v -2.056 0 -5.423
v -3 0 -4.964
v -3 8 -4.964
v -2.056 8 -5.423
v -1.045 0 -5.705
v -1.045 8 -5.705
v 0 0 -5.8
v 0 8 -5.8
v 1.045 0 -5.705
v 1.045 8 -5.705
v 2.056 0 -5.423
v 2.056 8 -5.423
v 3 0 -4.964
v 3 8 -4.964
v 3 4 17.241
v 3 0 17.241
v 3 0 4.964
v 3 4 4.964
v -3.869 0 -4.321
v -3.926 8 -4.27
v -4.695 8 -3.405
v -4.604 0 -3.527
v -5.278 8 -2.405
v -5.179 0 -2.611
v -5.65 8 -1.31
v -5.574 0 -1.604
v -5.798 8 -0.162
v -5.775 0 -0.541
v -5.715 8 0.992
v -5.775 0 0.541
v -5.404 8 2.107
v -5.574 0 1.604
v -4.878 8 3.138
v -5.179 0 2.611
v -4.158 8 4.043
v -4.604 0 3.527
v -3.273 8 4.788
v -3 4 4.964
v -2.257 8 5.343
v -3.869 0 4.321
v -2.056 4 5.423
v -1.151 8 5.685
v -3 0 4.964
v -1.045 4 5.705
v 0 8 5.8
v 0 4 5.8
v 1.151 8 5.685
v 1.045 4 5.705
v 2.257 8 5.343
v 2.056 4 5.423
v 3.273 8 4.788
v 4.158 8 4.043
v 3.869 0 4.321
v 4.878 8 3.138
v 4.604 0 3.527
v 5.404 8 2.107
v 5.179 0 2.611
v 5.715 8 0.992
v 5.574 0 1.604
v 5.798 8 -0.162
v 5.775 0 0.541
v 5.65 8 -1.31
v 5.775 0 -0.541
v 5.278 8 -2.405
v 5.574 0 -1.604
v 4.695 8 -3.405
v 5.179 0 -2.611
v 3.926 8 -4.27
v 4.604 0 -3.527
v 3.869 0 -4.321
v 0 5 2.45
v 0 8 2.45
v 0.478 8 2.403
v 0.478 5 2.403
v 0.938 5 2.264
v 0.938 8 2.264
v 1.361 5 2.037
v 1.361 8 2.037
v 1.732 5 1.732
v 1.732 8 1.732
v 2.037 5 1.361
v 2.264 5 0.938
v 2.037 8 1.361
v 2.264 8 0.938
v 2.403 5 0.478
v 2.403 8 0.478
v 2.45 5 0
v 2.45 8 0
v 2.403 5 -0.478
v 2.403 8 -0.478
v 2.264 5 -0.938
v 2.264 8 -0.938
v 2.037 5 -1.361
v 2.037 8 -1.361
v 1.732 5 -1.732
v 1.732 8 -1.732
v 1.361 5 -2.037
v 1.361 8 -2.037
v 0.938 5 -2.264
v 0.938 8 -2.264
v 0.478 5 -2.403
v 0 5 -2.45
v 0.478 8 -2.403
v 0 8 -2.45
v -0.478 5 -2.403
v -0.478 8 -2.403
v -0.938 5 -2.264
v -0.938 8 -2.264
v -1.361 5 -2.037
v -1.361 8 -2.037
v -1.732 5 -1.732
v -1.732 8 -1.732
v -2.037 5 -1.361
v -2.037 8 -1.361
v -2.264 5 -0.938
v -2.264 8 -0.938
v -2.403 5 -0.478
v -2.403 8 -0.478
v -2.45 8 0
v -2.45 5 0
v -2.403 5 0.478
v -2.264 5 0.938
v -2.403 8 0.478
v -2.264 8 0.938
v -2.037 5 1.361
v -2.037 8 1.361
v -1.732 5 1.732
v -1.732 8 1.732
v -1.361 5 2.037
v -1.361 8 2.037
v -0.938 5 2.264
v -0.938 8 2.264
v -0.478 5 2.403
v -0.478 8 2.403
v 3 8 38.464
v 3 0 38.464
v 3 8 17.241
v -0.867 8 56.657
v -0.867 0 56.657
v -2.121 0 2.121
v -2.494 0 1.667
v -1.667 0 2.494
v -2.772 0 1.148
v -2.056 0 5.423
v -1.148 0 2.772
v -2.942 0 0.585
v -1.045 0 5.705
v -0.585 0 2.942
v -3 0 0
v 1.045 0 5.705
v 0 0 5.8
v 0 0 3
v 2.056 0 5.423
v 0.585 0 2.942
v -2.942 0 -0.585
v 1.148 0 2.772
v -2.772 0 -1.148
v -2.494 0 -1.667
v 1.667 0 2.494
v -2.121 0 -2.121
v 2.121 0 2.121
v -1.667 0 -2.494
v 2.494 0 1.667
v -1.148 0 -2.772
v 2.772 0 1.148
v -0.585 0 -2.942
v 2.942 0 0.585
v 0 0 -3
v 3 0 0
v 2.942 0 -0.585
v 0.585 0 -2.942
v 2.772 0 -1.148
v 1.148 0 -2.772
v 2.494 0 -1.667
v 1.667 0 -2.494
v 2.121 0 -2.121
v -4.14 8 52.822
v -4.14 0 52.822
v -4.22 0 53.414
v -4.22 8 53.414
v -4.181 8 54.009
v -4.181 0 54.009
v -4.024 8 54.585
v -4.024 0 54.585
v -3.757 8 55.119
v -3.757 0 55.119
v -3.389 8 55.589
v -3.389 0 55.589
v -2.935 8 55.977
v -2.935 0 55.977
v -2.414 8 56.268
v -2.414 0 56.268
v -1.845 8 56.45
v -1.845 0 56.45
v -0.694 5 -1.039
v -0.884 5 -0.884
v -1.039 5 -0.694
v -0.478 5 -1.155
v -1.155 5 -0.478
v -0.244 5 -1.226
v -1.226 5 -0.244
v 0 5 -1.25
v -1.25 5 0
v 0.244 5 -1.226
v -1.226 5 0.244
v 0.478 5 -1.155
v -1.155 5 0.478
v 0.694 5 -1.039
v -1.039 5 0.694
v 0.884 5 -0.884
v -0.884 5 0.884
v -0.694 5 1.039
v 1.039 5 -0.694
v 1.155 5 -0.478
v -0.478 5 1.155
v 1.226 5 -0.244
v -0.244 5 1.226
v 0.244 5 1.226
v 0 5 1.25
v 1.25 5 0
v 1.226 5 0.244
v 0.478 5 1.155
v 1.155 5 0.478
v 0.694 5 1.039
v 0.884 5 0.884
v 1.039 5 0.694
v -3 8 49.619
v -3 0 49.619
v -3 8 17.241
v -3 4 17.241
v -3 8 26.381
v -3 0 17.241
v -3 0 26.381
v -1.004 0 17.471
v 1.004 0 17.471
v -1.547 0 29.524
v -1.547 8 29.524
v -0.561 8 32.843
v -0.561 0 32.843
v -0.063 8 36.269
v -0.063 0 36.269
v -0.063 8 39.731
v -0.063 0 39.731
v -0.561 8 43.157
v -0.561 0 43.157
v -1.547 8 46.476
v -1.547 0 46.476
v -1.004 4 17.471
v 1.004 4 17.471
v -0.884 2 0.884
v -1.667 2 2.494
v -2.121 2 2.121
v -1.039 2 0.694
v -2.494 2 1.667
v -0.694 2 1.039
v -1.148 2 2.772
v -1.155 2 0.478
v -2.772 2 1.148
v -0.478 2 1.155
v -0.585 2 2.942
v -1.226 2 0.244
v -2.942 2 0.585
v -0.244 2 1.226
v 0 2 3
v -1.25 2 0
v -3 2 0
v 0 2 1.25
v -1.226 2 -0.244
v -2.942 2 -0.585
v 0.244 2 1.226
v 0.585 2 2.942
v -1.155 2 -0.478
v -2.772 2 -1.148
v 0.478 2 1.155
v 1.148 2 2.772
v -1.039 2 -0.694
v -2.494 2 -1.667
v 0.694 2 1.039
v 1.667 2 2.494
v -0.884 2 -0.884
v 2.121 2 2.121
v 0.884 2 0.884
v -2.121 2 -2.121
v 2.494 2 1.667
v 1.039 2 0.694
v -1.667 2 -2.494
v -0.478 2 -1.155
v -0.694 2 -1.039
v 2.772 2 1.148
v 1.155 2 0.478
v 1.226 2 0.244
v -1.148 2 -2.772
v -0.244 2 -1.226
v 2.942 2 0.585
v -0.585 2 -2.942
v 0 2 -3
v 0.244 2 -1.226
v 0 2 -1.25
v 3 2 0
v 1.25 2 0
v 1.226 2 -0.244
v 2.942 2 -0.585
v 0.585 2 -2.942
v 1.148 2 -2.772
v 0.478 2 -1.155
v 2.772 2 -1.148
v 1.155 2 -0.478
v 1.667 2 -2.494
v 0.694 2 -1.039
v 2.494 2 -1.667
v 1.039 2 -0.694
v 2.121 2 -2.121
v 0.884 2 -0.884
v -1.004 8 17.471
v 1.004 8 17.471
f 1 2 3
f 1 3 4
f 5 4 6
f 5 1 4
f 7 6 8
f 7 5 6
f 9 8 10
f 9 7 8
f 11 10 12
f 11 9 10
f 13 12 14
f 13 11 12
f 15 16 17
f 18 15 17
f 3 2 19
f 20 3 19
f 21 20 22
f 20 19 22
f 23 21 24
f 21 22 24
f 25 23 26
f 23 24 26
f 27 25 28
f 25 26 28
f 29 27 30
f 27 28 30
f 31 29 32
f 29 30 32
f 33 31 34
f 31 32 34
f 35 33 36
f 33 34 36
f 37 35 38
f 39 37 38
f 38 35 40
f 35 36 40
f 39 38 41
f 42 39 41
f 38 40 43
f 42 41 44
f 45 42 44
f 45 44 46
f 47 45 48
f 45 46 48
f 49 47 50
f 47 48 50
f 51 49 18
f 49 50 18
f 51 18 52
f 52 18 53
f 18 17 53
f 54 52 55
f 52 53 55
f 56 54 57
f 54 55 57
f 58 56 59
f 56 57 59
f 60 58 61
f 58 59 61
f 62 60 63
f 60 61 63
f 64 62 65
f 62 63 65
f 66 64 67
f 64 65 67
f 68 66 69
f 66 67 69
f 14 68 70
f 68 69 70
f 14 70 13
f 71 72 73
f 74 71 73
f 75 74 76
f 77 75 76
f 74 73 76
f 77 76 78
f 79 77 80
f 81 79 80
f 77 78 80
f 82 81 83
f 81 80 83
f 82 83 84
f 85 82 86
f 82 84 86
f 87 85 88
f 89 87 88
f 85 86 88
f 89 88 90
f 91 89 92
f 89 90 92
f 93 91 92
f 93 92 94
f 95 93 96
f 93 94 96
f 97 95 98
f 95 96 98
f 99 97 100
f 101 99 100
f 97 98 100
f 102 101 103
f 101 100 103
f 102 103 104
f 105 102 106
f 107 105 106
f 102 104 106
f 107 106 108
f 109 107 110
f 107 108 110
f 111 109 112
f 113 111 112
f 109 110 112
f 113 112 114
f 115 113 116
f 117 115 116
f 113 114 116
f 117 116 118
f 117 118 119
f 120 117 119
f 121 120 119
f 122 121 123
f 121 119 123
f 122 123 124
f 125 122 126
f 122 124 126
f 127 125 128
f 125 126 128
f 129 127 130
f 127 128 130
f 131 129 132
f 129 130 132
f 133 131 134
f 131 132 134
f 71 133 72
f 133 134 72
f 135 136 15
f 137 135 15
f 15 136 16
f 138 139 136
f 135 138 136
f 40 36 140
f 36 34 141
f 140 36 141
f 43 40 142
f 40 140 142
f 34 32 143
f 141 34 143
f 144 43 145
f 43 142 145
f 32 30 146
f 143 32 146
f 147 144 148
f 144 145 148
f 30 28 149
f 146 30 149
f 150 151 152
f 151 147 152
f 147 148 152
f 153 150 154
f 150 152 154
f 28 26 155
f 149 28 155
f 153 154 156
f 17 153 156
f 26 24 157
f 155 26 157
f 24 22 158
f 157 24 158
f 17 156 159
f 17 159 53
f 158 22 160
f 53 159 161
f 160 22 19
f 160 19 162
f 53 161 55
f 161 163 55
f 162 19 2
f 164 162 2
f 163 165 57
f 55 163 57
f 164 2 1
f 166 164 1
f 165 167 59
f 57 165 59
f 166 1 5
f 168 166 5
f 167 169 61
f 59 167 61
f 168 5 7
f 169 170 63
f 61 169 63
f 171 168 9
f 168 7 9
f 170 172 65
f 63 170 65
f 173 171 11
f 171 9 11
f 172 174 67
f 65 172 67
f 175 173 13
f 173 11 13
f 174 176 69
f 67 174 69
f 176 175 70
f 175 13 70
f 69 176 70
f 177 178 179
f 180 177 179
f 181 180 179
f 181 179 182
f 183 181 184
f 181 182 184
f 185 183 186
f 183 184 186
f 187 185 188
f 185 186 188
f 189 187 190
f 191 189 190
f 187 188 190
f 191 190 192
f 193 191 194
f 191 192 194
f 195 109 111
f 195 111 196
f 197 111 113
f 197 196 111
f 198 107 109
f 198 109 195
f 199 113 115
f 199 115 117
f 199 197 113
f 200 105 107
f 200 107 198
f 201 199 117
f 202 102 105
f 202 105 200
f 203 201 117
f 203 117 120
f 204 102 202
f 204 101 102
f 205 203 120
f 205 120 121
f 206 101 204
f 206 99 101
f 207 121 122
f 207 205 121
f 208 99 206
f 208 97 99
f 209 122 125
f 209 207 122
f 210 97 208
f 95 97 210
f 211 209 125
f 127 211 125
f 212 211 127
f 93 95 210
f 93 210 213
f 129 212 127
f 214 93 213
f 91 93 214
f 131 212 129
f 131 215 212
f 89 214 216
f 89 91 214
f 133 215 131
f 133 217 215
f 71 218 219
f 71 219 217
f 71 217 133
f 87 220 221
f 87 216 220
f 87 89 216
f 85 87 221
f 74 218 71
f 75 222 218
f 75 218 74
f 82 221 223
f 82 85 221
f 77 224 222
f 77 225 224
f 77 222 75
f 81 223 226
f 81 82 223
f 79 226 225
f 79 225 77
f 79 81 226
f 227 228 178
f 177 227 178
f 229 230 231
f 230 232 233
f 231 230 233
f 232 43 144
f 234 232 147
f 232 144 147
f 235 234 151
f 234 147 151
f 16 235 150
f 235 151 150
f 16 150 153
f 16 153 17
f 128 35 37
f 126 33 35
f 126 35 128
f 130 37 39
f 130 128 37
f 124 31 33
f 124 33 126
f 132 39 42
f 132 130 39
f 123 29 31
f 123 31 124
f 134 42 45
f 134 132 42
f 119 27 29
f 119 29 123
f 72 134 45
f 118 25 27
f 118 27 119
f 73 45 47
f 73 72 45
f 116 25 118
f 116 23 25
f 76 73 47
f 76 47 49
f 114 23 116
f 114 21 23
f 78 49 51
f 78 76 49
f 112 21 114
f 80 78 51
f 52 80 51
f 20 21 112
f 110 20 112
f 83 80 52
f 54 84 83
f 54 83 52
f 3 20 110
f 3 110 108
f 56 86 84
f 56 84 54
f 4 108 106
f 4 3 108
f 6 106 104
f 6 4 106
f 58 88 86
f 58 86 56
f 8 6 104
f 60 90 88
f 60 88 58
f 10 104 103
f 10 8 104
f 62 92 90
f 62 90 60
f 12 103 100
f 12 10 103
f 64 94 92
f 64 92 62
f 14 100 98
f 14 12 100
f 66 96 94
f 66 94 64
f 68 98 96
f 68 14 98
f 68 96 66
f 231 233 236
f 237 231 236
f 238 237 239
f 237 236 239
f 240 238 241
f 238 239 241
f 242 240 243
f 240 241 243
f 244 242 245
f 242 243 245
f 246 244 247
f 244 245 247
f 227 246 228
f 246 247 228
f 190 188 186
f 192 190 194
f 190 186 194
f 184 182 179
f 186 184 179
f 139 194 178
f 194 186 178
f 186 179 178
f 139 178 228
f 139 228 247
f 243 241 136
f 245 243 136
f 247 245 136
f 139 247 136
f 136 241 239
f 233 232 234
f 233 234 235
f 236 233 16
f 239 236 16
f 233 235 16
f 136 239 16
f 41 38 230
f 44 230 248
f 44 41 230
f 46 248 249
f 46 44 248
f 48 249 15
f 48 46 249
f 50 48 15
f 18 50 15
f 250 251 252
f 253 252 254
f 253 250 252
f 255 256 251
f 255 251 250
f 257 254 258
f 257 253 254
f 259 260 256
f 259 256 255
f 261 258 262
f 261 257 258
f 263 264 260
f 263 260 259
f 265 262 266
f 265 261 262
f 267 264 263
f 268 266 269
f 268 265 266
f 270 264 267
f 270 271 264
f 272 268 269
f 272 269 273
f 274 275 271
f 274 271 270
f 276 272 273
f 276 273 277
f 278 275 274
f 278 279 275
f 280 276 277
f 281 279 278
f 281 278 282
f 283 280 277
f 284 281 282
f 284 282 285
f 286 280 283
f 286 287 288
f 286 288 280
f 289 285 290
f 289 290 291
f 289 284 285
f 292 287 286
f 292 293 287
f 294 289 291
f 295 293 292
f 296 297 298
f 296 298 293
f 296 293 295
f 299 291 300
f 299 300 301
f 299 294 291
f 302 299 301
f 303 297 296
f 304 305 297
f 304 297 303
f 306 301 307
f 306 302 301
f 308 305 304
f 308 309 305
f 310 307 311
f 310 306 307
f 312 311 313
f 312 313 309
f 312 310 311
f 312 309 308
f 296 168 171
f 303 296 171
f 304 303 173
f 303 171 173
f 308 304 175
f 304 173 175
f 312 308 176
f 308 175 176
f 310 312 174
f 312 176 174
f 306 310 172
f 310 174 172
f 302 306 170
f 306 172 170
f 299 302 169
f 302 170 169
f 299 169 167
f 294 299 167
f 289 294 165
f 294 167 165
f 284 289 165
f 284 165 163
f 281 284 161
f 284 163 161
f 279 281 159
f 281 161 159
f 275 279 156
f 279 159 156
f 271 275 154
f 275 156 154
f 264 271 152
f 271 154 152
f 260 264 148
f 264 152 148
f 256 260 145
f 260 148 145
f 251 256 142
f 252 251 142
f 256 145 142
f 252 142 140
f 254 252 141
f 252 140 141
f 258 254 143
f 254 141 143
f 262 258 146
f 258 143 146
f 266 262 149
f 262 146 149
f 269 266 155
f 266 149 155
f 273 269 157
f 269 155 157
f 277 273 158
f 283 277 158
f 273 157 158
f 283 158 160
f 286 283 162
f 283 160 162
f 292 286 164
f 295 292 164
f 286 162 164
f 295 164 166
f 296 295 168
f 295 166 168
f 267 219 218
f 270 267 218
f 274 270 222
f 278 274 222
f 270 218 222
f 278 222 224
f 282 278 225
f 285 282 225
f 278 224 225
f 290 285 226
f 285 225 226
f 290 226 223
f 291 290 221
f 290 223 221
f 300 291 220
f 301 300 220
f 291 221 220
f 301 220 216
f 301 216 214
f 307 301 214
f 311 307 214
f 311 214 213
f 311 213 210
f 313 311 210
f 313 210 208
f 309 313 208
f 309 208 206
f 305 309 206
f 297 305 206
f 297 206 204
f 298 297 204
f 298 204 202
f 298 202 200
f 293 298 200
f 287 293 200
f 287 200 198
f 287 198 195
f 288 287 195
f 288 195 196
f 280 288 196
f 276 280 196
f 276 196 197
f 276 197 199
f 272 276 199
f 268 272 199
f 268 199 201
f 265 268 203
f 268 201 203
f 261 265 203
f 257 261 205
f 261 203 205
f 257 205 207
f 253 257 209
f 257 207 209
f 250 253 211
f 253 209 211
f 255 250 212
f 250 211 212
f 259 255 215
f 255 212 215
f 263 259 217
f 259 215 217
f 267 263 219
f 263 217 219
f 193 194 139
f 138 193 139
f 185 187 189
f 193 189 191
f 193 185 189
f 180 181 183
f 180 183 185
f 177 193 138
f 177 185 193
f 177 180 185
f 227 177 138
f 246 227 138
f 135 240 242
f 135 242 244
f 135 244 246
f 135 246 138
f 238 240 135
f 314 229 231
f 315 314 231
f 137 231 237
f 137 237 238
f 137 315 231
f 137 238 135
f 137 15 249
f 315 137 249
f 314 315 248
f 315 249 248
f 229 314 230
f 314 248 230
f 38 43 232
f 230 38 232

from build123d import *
from build123d.topology import SkipClean

# Parameters (mm, degrees)
BOSS_EXTRU_1_DEPTH             = 8
ESQUISSE2_R                    = 2.45
ENL_V_MAT_EXTRU_1_DEPTH        = 3
ENL_V_MAT_EXTRU_2_REACH        = 59.173
ESQUISSE3_R                    = 1.25
ESQUISSE4_R                    = 3
ENL_V_MAT_EXTRU_3_DEPTH        = 2
ENL_V_START                    = -4
ENL_V_MAT_EXTRU_4_DEPTH        = 4
CORPS_D_PLACER_COPIER1_DEPTH   = 8
CORPS_D_PLACER_COPIER1_2_DEPTH = 8
CORPS_D_PLACER_COPIER1_3_DEPTH = 4


# Read off the part's stored shape, not the designer's step: Corps-Déplacer/Copier1
with BuildPart() as part:
    # Esquisse1 → Boss.-Extru.1 (new body)
    with BuildSketch(Plane(origin=(0, 0, 0), x_dir=(1, 0, 0), z_dir=(0, 1, 0))):
        with BuildLine():
            Line((-3, 26.381049961), (-3, 4.963869458))
            ThreePointArc((-3, 4.963869458), (0, -5.8), (3, 4.963869458))
            Line((3, 4.963869458), (3, 38.463869458))
            Line((3, 38.463869458), (-0.867157449, 56.657414832))
            Line((-0.867157449, 56.657414832), (-1.84530505, 56.449503141))
            ThreePointArc((-1.84530505, 56.449503141), (-3.756758837, 55.119060789), (-4.140414176, 52.821988519))
            Line((-4.140414176, 52.821988519), (-3, 49.618950039))
            ThreePointArc((-3, 49.618950039), (0, 38), (-3, 26.381049961))
        make_face()
    extrude(amount=BOSS_EXTRU_1_DEPTH)

    # Esquisse2 → Enlèv. mat.-Extru.1 (cut)
    with BuildSketch(Plane(origin=(0, 8, 0), x_dir=(1, 0, 0), z_dir=(0, 1, 0))):
        with Locations(Location((0, 0, 0), (0, 0, 270))):
            Circle(ESQUISSE2_R)
    extrude(amount=-ENL_V_MAT_EXTRU_1_DEPTH, mode=Mode.SUBTRACT)

    # Esquisse3 → Enlèv. mat.-Extru.2 (cut, up to next)
    with BuildSketch(Plane(origin=(0, 5, 0), x_dir=(1, 0, 0), z_dir=(0, 1, 0)), mode=Mode.PRIVATE) as enl_v_mat_extru_2_sk1:
        with Locations(Location((0, 0, 0), (0, 0, 270))):
            Circle(ESQUISSE3_R)
    enl_v_mat_extru_2_tool1 = extrude(enl_v_mat_extru_2_sk1.sketch, amount=-ENL_V_MAT_EXTRU_2_REACH, mode=Mode.PRIVATE) & part.part
    add(enl_v_mat_extru_2_tool1.solids().sort_by_distance((0, 5, 0))[0], mode=Mode.SUBTRACT)

    # Esquisse4 → Enlèv. mat.-Extru.3 (cut)
    with BuildSketch(Plane.XZ):
        with Locations(Location((0, 0, 0), (0, 0, 270))):
            Circle(ESQUISSE4_R)
    extrude(amount=-ENL_V_MAT_EXTRU_3_DEPTH, mode=Mode.SUBTRACT)

    # Esquisse5 → Enlèv. mat.-Extru.4 (cut)
    with BuildSketch(Plane(origin=(0, 8, 0), x_dir=(1, 0, 0), z_dir=(0, 1, 0)).offset(ENL_V_START)):
        with BuildLine():
            Line((-3, 4.963869458), (-3, 17.24093965))
            ThreePointArc((-3, 17.24093965), (0, 17.5), (3, 17.24093965))
            Line((3, 17.24093965), (3, 4.963869458))
            ThreePointArc((3, 4.963869458), (0, 5.8), (-3, 4.963869458))
        make_face()
    extrude(amount=ENL_V_MAT_EXTRU_4_DEPTH, mode=Mode.SUBTRACT)

    # Corps-Déplacer/Copier1 outline → Corps-Déplacer/Copier1 (cut)
    with SkipClean():  # the faces are left unmerged after this step: merging them gives an invalid solid
        with BuildSketch(Plane(origin=(0, 0, 0), x_dir=(1, 0, 0), z_dir=(0, 1, 0))):
            with BuildLine():
                ThreePointArc((-3, 4.963869458), (0, 5.8), (3, 4.963869458))
                Line((3, 4.963869458), (3, 38.463869458))
                Line((3, 38.463869458), (-0.867157449, 56.657414832))
                Line((-0.867157449, 56.657414832), (-1.84530505, 56.449503141))
                ThreePointArc((-1.84530505, 56.449503141), (-3.756758837, 55.119060789), (-4.140414176, 52.821988519))
                Line((-4.140414176, 52.821988519), (-3, 49.618950039))
                ThreePointArc((-3, 49.618950039), (0, 38), (-3, 26.381049961))
                Line((-3, 26.381049961), (-3, 4.963869458))
            make_face()
        extrude(amount=CORPS_D_PLACER_COPIER1_DEPTH, mode=Mode.SUBTRACT)



with BuildPart() as body_2:
    # Corps-D_placer_Copier1 2 outline → Corps-D_placer_Copier1 2 (new body)
    with BuildSketch(Plane(origin=(0, 0, 0), x_dir=(1, 0, 0), z_dir=(0, 1, 0))):
        with BuildLine():
            Line((3, -38.463869458), (3, -17.24093965))
            ThreePointArc((3, -17.24093965), (0, -17.5), (-3, -17.24093965))
            Line((-3, -17.24093965), (-3, -26.381049961))
            ThreePointArc((-3, -26.381049961), (0, -38), (-3, -49.618950039))
            Line((-3, -49.618950039), (-4.140414176, -52.821988519))
            ThreePointArc((-4.140414176, -52.821988519), (-3.756758837, -55.119060789), (-1.84530505, -56.449503141))
            Line((-1.84530505, -56.449503141), (-0.867157449, -56.657414832))
            Line((-0.867157449, -56.657414832), (3, -38.463869458))
        make_face()
    extrude(amount=CORPS_D_PLACER_COPIER1_2_DEPTH)


with BuildPart() as part_1:
    with SkipClean():  # the faces are left unmerged after this step: merging them gives an invalid solid
        add(part.part)

        add(body_2.part)  # Corps-D_placer_Copier1 3 merges body 2
        # Corps-D_placer_Copier1 3 outline → Corps-D_placer_Copier1 3 (add)
        with BuildSketch(Plane(origin=(0, 0, 0), x_dir=(1, 0, 0), z_dir=(0, 1, 0))):
            with BuildLine():
                Line((3, -17.24093965), (3, -4.963869458))
                ThreePointArc((3, -4.963869458), (0, -5.8), (-3, -4.963869458))
                Line((-3, -4.963869458), (-3, -17.24093965))
                ThreePointArc((-3, -17.24093965), (0, -17.5), (3, -17.24093965))
            make_face()
        extrude(amount=CORPS_D_PLACER_COPIER1_3_DEPTH)


solid = part_1.part
